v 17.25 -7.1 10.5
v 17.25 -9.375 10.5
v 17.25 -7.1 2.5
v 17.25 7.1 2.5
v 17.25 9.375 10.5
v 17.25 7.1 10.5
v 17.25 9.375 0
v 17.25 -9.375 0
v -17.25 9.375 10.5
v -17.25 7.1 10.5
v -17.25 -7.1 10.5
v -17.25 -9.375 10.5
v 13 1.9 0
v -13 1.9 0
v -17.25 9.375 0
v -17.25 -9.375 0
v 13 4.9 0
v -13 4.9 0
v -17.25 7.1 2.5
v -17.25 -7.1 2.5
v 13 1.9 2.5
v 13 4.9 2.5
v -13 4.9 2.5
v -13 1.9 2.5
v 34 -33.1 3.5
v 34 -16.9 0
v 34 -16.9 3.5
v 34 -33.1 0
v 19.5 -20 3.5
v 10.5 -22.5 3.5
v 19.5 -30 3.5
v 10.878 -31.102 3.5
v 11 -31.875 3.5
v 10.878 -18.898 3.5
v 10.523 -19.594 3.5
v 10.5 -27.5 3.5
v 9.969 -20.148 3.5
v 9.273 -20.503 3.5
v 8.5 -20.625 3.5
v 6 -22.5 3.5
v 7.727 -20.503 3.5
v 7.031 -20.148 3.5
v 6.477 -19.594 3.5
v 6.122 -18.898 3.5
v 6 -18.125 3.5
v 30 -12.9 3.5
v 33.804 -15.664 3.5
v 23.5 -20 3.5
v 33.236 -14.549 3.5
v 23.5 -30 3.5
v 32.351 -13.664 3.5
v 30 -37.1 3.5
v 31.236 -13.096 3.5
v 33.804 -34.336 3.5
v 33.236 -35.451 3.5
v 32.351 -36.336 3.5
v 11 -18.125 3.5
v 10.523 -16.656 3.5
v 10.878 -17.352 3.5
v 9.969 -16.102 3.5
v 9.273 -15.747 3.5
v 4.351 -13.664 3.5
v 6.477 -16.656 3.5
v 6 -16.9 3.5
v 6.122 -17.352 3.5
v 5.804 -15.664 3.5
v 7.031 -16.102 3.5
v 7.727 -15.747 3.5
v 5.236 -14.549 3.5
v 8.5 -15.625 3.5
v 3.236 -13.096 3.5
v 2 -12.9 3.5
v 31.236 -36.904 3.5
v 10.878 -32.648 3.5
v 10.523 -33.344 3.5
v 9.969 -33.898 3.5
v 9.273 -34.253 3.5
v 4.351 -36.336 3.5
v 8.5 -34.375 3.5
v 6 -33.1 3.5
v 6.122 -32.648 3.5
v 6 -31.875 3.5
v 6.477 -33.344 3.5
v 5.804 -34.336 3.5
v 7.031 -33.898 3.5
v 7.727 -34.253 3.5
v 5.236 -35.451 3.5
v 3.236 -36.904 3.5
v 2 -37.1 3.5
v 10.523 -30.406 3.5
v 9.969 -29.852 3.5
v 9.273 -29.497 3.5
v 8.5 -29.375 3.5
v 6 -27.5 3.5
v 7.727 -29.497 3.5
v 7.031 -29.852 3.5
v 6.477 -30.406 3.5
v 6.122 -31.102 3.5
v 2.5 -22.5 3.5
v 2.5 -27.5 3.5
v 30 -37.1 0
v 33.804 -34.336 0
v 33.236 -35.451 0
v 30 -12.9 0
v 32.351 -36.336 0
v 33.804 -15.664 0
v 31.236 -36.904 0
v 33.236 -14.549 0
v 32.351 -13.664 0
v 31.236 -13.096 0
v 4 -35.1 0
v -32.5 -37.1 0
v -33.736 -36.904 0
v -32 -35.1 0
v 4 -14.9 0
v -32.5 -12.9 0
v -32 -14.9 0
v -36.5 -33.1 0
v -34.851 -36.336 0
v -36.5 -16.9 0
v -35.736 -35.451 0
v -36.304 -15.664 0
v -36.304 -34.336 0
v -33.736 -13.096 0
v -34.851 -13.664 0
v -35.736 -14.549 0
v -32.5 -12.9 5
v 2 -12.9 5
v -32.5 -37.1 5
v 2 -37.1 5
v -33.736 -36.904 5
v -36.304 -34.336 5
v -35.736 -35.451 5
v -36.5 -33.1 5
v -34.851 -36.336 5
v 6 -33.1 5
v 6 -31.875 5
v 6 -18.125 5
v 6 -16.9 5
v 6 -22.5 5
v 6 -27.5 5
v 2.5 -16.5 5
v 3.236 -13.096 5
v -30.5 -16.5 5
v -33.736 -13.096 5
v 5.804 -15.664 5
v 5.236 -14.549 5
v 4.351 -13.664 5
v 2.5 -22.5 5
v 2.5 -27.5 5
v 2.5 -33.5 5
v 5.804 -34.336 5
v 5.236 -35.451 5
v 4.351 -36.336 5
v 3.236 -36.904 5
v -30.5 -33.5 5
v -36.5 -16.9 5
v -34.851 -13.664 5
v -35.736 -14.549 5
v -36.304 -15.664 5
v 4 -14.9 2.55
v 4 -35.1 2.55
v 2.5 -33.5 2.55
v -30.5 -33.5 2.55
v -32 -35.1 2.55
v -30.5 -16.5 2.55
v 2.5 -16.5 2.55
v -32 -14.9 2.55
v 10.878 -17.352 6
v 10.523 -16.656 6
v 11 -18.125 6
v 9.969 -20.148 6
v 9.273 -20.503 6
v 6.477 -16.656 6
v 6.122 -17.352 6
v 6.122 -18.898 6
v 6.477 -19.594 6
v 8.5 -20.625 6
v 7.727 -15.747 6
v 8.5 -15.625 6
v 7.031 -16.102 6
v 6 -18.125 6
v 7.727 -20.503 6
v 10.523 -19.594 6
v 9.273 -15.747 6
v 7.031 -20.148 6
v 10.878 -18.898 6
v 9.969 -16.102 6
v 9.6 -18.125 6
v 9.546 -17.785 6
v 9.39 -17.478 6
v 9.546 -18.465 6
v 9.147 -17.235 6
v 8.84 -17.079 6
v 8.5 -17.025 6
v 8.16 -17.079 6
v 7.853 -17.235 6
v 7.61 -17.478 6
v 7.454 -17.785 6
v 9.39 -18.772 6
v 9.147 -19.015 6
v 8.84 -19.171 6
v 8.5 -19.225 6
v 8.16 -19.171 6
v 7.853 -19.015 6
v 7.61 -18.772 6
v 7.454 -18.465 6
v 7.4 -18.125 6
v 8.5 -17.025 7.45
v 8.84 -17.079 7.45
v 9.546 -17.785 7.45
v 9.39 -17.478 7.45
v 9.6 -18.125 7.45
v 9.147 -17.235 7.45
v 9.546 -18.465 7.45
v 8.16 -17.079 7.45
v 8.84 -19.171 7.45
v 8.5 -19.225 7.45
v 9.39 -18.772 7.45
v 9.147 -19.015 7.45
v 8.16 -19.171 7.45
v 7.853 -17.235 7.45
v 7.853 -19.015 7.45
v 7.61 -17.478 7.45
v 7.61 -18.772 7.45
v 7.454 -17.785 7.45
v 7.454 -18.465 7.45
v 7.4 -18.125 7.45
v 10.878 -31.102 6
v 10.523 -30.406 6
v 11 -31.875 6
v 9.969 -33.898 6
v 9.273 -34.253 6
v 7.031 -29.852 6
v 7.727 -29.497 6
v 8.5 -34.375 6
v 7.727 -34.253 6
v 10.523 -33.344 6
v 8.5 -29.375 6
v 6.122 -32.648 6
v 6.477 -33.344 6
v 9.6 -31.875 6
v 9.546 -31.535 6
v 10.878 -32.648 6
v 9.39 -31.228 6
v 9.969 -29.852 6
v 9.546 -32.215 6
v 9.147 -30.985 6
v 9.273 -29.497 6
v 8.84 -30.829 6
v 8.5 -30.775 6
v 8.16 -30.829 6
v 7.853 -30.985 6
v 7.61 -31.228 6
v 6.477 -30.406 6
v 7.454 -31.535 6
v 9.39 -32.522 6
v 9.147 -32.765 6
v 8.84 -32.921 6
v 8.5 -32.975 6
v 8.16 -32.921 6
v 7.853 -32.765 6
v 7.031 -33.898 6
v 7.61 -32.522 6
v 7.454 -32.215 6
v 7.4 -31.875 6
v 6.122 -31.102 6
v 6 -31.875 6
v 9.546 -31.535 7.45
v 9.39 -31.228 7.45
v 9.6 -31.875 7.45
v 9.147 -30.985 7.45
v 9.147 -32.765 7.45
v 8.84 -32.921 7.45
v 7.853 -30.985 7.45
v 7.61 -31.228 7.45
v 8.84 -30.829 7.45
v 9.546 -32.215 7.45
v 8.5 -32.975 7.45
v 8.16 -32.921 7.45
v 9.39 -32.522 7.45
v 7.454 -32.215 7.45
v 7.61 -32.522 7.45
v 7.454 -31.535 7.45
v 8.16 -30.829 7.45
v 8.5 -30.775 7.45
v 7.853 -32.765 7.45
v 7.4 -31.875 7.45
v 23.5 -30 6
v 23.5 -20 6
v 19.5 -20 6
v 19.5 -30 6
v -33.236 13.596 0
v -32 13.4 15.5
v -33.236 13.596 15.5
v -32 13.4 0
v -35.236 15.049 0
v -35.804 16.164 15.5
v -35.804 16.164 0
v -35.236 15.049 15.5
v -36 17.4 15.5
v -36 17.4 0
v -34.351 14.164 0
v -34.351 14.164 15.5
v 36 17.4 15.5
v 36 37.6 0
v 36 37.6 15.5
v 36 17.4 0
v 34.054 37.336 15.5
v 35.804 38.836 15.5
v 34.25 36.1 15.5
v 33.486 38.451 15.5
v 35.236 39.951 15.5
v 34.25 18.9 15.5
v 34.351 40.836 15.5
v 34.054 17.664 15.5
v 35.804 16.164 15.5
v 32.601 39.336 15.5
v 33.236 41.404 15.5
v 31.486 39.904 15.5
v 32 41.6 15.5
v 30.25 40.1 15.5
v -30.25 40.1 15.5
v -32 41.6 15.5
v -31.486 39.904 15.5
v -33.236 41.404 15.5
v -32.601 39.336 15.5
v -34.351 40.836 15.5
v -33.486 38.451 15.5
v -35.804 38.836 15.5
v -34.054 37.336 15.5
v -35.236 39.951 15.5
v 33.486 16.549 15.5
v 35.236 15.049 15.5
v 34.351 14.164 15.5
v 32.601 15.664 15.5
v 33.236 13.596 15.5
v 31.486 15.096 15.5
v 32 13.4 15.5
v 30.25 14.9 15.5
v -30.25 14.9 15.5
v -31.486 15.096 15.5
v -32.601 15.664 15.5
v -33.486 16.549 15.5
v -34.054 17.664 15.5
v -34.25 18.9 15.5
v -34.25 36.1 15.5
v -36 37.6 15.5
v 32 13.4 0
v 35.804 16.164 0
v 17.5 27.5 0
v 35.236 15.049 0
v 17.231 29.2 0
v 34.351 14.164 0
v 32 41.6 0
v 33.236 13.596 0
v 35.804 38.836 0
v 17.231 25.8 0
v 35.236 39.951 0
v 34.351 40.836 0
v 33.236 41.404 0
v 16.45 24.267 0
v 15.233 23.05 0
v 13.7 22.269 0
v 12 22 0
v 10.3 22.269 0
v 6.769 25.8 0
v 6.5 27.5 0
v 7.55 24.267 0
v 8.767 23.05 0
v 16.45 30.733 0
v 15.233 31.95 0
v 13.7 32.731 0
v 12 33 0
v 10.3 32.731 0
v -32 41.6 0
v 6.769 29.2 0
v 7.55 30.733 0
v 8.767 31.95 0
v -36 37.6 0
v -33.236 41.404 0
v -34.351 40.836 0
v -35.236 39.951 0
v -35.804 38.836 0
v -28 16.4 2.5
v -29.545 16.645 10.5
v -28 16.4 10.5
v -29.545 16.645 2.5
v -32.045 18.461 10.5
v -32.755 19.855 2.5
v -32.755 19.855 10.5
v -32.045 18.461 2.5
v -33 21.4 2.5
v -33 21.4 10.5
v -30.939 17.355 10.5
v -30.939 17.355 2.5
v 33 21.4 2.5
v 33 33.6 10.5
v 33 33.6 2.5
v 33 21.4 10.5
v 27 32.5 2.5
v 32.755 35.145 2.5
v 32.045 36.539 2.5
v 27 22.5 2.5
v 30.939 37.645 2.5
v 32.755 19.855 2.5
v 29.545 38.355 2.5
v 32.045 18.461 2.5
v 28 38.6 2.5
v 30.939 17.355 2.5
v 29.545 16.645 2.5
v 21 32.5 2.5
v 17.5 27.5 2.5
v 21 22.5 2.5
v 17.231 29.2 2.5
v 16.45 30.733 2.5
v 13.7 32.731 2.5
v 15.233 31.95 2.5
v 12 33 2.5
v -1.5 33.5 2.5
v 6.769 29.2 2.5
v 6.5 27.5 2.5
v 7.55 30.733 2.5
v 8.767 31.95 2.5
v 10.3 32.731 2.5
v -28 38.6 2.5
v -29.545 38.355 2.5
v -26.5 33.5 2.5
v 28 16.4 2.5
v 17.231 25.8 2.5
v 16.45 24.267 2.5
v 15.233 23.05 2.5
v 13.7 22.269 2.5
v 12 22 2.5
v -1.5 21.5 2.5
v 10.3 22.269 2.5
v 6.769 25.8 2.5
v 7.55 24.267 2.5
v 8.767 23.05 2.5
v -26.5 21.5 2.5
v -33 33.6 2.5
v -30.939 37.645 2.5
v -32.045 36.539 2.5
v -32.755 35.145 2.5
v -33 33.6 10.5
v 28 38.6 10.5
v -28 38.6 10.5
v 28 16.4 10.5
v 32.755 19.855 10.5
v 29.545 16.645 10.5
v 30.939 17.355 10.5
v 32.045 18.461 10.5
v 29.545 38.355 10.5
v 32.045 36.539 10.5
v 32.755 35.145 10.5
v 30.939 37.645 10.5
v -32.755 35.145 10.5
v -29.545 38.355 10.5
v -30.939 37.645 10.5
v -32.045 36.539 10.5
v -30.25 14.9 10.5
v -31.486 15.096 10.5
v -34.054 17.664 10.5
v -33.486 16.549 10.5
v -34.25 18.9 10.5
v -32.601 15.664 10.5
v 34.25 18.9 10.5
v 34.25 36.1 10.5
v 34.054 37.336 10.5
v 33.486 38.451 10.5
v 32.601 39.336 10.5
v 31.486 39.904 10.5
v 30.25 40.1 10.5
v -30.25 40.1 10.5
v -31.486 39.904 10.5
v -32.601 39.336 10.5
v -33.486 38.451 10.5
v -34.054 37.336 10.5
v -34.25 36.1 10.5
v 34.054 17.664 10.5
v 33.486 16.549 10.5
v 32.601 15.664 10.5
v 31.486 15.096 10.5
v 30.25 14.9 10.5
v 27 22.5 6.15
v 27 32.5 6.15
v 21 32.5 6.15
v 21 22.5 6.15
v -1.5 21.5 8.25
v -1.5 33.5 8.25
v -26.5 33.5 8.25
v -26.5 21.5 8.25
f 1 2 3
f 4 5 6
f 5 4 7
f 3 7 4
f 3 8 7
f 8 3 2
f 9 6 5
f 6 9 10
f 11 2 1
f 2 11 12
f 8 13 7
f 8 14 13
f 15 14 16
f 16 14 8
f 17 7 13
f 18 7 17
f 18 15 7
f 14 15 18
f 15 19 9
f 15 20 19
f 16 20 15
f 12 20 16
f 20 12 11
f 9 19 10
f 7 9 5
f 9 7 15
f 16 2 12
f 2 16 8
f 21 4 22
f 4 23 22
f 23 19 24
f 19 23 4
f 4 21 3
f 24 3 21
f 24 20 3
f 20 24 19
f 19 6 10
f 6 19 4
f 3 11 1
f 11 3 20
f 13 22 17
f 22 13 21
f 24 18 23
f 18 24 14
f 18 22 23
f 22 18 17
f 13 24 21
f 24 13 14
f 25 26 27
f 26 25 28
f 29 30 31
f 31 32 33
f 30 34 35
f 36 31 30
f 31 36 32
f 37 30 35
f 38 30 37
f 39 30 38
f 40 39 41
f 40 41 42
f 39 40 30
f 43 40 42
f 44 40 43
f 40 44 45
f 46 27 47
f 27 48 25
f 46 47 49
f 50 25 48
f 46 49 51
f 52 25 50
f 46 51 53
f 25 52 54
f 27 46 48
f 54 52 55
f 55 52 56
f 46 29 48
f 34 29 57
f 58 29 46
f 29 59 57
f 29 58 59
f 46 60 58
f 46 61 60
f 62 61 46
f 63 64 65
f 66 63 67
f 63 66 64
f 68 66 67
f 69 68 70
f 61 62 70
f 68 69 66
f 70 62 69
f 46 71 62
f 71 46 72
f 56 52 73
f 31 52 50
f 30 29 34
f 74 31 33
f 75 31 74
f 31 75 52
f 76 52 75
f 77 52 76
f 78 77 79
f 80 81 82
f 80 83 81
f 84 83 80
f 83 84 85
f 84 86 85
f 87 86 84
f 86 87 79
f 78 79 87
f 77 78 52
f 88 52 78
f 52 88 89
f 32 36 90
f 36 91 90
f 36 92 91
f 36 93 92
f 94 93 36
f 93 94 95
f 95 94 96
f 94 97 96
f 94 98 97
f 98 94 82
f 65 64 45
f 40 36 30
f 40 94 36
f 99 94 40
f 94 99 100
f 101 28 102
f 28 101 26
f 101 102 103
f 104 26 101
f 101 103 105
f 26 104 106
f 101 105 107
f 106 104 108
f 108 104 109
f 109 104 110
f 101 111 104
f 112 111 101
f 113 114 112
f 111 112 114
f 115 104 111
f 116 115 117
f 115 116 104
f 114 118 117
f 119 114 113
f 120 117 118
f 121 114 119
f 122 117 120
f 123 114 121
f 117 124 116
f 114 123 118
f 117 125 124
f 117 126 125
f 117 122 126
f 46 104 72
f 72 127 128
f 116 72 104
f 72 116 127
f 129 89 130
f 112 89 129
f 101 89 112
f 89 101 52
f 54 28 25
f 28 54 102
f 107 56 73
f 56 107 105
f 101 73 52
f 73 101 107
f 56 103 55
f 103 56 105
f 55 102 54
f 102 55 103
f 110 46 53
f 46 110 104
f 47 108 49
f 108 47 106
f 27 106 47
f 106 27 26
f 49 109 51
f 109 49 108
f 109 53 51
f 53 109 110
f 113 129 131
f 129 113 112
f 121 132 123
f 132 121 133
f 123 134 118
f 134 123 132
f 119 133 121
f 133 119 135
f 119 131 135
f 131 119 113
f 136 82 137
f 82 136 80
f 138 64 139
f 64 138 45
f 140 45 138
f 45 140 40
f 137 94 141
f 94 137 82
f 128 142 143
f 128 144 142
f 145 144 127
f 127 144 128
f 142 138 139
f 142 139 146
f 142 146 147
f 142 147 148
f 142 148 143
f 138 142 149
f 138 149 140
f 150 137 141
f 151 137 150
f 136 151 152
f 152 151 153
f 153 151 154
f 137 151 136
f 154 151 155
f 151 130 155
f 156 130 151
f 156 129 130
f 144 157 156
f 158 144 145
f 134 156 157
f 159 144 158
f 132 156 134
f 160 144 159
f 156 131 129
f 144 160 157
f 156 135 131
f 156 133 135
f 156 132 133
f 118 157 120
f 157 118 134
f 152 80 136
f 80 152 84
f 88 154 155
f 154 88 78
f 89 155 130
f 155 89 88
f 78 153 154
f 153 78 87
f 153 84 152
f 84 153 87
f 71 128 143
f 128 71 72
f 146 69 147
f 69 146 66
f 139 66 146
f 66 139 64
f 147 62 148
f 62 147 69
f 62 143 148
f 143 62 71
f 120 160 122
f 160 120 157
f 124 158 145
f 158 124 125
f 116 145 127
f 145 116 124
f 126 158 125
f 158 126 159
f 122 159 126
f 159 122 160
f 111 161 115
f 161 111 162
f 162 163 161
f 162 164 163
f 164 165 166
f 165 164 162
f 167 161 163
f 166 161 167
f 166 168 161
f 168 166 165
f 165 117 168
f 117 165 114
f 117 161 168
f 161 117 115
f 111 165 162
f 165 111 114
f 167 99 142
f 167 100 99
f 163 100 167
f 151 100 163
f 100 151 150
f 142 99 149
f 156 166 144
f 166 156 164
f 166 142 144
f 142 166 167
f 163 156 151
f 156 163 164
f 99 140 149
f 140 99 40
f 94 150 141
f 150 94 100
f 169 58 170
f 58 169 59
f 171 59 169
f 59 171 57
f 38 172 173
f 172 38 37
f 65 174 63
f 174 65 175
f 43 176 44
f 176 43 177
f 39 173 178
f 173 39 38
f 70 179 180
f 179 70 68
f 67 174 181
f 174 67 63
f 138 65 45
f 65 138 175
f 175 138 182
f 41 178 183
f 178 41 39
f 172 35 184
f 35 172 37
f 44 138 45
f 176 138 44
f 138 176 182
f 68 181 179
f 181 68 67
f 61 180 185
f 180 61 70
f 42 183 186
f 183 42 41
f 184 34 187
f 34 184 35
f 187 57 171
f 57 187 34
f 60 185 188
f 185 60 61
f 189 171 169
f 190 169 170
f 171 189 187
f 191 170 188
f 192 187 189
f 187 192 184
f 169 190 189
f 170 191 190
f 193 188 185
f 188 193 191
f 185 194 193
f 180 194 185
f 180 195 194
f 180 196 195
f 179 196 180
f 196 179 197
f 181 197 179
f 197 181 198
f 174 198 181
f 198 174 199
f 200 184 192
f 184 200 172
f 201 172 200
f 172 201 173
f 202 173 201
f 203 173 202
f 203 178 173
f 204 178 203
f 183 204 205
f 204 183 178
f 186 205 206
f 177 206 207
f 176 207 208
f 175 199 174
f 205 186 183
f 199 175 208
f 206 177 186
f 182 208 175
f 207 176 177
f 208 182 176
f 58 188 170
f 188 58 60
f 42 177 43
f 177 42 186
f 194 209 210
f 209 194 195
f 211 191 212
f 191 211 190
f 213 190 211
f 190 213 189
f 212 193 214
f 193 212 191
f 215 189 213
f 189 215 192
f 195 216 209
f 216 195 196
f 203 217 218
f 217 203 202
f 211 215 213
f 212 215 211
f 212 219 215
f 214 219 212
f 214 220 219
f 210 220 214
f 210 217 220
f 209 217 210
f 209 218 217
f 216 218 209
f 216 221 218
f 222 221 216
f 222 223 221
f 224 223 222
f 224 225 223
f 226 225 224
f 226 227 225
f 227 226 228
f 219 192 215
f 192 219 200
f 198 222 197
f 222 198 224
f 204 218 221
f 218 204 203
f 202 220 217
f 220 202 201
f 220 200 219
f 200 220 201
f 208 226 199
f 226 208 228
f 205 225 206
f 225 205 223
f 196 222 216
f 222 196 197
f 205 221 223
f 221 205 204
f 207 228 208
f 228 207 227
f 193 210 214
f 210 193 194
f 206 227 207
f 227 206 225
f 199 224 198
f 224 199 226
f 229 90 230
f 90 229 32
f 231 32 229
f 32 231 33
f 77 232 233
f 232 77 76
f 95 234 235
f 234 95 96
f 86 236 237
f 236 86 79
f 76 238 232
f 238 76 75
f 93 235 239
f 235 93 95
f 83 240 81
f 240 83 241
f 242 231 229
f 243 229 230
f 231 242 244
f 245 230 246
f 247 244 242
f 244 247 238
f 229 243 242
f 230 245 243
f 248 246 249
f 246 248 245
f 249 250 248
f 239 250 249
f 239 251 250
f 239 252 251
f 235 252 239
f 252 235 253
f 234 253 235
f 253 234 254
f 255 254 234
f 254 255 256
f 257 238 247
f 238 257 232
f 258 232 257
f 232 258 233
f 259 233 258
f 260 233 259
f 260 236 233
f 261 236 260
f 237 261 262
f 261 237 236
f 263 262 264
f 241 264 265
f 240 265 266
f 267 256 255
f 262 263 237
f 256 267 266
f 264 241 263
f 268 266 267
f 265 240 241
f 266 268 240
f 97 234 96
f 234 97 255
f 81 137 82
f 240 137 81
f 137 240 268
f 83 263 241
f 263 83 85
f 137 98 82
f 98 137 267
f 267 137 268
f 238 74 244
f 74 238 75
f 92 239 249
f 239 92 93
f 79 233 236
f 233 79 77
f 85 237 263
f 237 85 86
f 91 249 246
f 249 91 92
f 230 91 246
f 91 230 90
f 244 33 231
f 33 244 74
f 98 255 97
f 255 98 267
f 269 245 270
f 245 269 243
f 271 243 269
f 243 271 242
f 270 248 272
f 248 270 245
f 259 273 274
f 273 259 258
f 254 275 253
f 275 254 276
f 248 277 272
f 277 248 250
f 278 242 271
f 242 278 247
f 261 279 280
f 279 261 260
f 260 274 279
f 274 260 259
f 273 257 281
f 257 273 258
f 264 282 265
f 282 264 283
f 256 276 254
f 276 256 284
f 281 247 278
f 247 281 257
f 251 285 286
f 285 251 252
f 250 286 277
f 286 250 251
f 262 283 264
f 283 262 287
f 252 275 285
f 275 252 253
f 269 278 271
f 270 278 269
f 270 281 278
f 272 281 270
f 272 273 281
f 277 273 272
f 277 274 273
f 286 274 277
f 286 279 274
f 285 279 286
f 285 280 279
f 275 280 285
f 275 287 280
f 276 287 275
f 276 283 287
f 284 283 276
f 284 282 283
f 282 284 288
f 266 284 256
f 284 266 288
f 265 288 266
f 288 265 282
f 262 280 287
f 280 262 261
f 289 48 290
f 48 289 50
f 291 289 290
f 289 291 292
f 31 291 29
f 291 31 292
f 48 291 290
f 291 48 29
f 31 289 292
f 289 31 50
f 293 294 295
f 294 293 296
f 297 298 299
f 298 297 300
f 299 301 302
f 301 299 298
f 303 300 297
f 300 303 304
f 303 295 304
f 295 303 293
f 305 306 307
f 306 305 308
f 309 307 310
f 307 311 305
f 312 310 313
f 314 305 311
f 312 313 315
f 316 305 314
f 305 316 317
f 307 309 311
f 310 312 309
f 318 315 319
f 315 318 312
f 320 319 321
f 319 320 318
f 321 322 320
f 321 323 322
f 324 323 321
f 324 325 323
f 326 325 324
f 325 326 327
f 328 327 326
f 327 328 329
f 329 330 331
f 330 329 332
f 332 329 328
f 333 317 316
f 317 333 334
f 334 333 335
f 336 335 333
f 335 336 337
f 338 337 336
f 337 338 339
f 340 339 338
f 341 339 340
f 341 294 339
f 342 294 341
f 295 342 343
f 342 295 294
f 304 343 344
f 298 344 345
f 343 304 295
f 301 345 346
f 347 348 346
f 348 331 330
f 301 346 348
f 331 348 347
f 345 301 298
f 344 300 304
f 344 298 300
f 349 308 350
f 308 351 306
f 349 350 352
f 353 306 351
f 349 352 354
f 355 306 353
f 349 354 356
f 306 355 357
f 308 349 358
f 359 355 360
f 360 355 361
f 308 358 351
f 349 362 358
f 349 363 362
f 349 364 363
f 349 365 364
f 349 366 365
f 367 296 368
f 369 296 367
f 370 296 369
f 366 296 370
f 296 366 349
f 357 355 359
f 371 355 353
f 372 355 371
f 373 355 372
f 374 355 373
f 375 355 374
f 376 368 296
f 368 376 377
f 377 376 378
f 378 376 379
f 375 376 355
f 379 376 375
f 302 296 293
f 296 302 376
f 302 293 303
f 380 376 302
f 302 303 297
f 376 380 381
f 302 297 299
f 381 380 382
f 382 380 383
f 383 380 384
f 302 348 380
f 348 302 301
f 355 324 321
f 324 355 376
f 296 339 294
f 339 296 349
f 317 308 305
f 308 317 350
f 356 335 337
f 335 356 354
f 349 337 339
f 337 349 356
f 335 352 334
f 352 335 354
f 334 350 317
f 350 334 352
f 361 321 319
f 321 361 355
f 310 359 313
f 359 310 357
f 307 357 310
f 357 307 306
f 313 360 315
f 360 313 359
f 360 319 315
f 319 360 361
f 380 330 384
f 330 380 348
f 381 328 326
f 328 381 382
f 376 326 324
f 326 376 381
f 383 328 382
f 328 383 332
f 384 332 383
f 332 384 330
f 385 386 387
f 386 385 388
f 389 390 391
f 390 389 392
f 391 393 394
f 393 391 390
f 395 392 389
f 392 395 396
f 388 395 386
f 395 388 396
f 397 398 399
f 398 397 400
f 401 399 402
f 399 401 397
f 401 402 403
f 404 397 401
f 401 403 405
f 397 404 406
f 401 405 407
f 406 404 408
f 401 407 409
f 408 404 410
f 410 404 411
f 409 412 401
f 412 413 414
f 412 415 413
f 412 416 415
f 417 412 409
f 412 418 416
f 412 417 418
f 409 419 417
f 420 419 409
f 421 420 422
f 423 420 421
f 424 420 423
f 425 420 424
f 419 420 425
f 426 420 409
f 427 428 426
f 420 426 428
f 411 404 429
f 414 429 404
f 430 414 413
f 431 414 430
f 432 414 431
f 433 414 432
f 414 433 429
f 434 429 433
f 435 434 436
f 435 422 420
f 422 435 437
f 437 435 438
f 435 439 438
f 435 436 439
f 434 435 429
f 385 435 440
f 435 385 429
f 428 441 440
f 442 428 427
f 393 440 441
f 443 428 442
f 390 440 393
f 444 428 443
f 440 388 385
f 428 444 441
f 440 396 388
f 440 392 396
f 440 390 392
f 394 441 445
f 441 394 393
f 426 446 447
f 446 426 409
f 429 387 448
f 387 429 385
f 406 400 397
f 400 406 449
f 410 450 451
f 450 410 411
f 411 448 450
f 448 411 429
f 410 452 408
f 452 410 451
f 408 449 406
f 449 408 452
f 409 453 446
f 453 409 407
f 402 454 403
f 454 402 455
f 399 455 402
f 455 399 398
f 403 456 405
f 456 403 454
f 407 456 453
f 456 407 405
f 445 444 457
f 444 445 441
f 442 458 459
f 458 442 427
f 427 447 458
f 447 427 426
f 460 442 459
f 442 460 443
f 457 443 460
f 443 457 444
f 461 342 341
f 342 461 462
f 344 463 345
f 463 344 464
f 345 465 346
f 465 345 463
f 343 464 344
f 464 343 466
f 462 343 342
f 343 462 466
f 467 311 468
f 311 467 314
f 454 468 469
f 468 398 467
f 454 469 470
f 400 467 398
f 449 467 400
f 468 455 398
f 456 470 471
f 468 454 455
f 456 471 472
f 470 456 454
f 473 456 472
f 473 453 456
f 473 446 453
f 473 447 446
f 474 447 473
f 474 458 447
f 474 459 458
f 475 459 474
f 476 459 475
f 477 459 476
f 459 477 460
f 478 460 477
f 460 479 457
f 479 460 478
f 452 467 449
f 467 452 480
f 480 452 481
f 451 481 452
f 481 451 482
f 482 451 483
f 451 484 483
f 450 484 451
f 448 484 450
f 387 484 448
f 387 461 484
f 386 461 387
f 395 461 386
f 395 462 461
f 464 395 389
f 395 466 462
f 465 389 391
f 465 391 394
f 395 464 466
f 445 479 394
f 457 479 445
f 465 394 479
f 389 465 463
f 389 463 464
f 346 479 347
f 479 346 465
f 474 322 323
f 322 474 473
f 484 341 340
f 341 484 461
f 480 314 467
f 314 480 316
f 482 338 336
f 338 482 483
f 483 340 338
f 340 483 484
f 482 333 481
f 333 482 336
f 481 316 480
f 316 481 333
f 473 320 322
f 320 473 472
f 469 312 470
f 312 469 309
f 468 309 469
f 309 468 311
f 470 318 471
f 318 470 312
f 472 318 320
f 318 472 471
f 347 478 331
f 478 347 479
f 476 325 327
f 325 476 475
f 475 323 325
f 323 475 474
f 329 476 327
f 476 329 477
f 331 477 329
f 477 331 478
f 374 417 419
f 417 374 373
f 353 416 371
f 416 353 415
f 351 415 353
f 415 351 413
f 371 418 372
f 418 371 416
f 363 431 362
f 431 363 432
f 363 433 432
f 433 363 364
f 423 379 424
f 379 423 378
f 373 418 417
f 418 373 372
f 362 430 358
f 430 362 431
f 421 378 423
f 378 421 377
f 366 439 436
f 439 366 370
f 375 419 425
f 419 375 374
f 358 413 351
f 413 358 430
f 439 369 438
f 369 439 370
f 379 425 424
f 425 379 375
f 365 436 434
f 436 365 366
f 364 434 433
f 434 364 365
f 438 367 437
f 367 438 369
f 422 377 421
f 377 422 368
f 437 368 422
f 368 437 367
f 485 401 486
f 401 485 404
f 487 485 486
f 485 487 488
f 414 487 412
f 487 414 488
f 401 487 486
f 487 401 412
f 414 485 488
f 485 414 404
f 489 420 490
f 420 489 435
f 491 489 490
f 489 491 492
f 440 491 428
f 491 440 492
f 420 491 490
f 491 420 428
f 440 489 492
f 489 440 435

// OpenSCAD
$fn=20;

translate([0,0,10.5/2]) makeheaderadapter();
translate([0,-25,1.25]) makebackplate();
translate([0,27.5,15.5/2]) maketopbox();

module maketopbox()
{
  union()
  {
    difference()
    {
      translate([0,0,0]) roundedbox(68+4,24.2+4,15.5,4);
      translate([0,0,2.5]) roundedbox(68-2,24.2-2,15.5,5);
      translate([0,0,15.5/2]) roundedbox(68+0.5,24.2+1,10,4);
      translate([34-22,0,0]) cylinder(h=20,r1=11/2,r2=11/2,center=true);
    }
    translate([24,0,-7.75+(5/2)+1.25-0.1]) cube([6,10,5],center=true);
    translate([-14,0,-7.75+(7/2)+1.25]) cube([25,12,7],center=true);
  }
}

module makebackplate()
{
  union()
  {
    difference()
    {
      union()
      {
        translate([0,0,0.5]) roundedbox(68,24.2,2.5+1,4);
        translate([-15.25,0,1.25]) roundedbox(42.5,24.2,5,4);
      }
      translate([-14,0,0]) cube([36,20.2,2.6],center=true);
      translate([-14,0,0]) cube([33,17,10],center=true);
      translate([5.5,0,7.25]) cube([10,5,10],center=true);
    }
    translate([8.5,6.875,2.25]) cylinder(h=5,r1=5/2,r2=5/2,center=true);
    translate([8.5,6.875,3.7]) cylinder(h=5,r1=2.2/2,r2=2.2/2,center=true);
    translate([8.5,-6.875,2.25]) cylinder(h=5,r1=5/2,r2=5/2,center=true);
    translate([8.5,-6.875,3.7]) cylinder(h=5,r1=2.2/2,r2=2.2/2,center=true);
    translate([21.5,0,2.25]) cube([4,10,5],center=true);
  }
}

module makeheaderadapter()
{
  difference()
  {
    translate([0,0,0]) cube([34.5,18.75,10.5],center=true);
    translate([0,0,1.25]) cube([45,14.2,8],center=true);
    translate([0,3.4,0]) cube([26,3,20],center=true);
  }
}

module roundedbox(l,d,h,r)
{
  difference()
  {
    difference()
    {
      difference()
      {
        difference()
        {
          cube([l,d,h],center=true);
          translate([-(l/2)+r,-(d/2)+r,0]){corner(r,h,0);};
        }
        translate([(l/2)-r,-(d/2)+r,0]){corner(r,h,90);};
      }
      translate([(l/2)-r,(d/2)-r,0]){corner(r,h,180);};
    }
    translate([-(l/2)+r,(d/2)-r,0]){corner(r,h,270);};
  }
}

module corner(r,h,ang)
{
  rotate([0,0,ang])
  {
    difference()
    {
      difference()
      {
        difference()
        {
          cylinder(h*2,r*2,r*2,center=true);
          cylinder(h*2,r,r,center=true);
        }
        translate([r*5,0,0]){cube([r*10,r*10,h*2],center=true);}
      }
      translate([0,r*5,0]){cube([r*10,r*10,h*2],center=true);}
    }
  }
}
